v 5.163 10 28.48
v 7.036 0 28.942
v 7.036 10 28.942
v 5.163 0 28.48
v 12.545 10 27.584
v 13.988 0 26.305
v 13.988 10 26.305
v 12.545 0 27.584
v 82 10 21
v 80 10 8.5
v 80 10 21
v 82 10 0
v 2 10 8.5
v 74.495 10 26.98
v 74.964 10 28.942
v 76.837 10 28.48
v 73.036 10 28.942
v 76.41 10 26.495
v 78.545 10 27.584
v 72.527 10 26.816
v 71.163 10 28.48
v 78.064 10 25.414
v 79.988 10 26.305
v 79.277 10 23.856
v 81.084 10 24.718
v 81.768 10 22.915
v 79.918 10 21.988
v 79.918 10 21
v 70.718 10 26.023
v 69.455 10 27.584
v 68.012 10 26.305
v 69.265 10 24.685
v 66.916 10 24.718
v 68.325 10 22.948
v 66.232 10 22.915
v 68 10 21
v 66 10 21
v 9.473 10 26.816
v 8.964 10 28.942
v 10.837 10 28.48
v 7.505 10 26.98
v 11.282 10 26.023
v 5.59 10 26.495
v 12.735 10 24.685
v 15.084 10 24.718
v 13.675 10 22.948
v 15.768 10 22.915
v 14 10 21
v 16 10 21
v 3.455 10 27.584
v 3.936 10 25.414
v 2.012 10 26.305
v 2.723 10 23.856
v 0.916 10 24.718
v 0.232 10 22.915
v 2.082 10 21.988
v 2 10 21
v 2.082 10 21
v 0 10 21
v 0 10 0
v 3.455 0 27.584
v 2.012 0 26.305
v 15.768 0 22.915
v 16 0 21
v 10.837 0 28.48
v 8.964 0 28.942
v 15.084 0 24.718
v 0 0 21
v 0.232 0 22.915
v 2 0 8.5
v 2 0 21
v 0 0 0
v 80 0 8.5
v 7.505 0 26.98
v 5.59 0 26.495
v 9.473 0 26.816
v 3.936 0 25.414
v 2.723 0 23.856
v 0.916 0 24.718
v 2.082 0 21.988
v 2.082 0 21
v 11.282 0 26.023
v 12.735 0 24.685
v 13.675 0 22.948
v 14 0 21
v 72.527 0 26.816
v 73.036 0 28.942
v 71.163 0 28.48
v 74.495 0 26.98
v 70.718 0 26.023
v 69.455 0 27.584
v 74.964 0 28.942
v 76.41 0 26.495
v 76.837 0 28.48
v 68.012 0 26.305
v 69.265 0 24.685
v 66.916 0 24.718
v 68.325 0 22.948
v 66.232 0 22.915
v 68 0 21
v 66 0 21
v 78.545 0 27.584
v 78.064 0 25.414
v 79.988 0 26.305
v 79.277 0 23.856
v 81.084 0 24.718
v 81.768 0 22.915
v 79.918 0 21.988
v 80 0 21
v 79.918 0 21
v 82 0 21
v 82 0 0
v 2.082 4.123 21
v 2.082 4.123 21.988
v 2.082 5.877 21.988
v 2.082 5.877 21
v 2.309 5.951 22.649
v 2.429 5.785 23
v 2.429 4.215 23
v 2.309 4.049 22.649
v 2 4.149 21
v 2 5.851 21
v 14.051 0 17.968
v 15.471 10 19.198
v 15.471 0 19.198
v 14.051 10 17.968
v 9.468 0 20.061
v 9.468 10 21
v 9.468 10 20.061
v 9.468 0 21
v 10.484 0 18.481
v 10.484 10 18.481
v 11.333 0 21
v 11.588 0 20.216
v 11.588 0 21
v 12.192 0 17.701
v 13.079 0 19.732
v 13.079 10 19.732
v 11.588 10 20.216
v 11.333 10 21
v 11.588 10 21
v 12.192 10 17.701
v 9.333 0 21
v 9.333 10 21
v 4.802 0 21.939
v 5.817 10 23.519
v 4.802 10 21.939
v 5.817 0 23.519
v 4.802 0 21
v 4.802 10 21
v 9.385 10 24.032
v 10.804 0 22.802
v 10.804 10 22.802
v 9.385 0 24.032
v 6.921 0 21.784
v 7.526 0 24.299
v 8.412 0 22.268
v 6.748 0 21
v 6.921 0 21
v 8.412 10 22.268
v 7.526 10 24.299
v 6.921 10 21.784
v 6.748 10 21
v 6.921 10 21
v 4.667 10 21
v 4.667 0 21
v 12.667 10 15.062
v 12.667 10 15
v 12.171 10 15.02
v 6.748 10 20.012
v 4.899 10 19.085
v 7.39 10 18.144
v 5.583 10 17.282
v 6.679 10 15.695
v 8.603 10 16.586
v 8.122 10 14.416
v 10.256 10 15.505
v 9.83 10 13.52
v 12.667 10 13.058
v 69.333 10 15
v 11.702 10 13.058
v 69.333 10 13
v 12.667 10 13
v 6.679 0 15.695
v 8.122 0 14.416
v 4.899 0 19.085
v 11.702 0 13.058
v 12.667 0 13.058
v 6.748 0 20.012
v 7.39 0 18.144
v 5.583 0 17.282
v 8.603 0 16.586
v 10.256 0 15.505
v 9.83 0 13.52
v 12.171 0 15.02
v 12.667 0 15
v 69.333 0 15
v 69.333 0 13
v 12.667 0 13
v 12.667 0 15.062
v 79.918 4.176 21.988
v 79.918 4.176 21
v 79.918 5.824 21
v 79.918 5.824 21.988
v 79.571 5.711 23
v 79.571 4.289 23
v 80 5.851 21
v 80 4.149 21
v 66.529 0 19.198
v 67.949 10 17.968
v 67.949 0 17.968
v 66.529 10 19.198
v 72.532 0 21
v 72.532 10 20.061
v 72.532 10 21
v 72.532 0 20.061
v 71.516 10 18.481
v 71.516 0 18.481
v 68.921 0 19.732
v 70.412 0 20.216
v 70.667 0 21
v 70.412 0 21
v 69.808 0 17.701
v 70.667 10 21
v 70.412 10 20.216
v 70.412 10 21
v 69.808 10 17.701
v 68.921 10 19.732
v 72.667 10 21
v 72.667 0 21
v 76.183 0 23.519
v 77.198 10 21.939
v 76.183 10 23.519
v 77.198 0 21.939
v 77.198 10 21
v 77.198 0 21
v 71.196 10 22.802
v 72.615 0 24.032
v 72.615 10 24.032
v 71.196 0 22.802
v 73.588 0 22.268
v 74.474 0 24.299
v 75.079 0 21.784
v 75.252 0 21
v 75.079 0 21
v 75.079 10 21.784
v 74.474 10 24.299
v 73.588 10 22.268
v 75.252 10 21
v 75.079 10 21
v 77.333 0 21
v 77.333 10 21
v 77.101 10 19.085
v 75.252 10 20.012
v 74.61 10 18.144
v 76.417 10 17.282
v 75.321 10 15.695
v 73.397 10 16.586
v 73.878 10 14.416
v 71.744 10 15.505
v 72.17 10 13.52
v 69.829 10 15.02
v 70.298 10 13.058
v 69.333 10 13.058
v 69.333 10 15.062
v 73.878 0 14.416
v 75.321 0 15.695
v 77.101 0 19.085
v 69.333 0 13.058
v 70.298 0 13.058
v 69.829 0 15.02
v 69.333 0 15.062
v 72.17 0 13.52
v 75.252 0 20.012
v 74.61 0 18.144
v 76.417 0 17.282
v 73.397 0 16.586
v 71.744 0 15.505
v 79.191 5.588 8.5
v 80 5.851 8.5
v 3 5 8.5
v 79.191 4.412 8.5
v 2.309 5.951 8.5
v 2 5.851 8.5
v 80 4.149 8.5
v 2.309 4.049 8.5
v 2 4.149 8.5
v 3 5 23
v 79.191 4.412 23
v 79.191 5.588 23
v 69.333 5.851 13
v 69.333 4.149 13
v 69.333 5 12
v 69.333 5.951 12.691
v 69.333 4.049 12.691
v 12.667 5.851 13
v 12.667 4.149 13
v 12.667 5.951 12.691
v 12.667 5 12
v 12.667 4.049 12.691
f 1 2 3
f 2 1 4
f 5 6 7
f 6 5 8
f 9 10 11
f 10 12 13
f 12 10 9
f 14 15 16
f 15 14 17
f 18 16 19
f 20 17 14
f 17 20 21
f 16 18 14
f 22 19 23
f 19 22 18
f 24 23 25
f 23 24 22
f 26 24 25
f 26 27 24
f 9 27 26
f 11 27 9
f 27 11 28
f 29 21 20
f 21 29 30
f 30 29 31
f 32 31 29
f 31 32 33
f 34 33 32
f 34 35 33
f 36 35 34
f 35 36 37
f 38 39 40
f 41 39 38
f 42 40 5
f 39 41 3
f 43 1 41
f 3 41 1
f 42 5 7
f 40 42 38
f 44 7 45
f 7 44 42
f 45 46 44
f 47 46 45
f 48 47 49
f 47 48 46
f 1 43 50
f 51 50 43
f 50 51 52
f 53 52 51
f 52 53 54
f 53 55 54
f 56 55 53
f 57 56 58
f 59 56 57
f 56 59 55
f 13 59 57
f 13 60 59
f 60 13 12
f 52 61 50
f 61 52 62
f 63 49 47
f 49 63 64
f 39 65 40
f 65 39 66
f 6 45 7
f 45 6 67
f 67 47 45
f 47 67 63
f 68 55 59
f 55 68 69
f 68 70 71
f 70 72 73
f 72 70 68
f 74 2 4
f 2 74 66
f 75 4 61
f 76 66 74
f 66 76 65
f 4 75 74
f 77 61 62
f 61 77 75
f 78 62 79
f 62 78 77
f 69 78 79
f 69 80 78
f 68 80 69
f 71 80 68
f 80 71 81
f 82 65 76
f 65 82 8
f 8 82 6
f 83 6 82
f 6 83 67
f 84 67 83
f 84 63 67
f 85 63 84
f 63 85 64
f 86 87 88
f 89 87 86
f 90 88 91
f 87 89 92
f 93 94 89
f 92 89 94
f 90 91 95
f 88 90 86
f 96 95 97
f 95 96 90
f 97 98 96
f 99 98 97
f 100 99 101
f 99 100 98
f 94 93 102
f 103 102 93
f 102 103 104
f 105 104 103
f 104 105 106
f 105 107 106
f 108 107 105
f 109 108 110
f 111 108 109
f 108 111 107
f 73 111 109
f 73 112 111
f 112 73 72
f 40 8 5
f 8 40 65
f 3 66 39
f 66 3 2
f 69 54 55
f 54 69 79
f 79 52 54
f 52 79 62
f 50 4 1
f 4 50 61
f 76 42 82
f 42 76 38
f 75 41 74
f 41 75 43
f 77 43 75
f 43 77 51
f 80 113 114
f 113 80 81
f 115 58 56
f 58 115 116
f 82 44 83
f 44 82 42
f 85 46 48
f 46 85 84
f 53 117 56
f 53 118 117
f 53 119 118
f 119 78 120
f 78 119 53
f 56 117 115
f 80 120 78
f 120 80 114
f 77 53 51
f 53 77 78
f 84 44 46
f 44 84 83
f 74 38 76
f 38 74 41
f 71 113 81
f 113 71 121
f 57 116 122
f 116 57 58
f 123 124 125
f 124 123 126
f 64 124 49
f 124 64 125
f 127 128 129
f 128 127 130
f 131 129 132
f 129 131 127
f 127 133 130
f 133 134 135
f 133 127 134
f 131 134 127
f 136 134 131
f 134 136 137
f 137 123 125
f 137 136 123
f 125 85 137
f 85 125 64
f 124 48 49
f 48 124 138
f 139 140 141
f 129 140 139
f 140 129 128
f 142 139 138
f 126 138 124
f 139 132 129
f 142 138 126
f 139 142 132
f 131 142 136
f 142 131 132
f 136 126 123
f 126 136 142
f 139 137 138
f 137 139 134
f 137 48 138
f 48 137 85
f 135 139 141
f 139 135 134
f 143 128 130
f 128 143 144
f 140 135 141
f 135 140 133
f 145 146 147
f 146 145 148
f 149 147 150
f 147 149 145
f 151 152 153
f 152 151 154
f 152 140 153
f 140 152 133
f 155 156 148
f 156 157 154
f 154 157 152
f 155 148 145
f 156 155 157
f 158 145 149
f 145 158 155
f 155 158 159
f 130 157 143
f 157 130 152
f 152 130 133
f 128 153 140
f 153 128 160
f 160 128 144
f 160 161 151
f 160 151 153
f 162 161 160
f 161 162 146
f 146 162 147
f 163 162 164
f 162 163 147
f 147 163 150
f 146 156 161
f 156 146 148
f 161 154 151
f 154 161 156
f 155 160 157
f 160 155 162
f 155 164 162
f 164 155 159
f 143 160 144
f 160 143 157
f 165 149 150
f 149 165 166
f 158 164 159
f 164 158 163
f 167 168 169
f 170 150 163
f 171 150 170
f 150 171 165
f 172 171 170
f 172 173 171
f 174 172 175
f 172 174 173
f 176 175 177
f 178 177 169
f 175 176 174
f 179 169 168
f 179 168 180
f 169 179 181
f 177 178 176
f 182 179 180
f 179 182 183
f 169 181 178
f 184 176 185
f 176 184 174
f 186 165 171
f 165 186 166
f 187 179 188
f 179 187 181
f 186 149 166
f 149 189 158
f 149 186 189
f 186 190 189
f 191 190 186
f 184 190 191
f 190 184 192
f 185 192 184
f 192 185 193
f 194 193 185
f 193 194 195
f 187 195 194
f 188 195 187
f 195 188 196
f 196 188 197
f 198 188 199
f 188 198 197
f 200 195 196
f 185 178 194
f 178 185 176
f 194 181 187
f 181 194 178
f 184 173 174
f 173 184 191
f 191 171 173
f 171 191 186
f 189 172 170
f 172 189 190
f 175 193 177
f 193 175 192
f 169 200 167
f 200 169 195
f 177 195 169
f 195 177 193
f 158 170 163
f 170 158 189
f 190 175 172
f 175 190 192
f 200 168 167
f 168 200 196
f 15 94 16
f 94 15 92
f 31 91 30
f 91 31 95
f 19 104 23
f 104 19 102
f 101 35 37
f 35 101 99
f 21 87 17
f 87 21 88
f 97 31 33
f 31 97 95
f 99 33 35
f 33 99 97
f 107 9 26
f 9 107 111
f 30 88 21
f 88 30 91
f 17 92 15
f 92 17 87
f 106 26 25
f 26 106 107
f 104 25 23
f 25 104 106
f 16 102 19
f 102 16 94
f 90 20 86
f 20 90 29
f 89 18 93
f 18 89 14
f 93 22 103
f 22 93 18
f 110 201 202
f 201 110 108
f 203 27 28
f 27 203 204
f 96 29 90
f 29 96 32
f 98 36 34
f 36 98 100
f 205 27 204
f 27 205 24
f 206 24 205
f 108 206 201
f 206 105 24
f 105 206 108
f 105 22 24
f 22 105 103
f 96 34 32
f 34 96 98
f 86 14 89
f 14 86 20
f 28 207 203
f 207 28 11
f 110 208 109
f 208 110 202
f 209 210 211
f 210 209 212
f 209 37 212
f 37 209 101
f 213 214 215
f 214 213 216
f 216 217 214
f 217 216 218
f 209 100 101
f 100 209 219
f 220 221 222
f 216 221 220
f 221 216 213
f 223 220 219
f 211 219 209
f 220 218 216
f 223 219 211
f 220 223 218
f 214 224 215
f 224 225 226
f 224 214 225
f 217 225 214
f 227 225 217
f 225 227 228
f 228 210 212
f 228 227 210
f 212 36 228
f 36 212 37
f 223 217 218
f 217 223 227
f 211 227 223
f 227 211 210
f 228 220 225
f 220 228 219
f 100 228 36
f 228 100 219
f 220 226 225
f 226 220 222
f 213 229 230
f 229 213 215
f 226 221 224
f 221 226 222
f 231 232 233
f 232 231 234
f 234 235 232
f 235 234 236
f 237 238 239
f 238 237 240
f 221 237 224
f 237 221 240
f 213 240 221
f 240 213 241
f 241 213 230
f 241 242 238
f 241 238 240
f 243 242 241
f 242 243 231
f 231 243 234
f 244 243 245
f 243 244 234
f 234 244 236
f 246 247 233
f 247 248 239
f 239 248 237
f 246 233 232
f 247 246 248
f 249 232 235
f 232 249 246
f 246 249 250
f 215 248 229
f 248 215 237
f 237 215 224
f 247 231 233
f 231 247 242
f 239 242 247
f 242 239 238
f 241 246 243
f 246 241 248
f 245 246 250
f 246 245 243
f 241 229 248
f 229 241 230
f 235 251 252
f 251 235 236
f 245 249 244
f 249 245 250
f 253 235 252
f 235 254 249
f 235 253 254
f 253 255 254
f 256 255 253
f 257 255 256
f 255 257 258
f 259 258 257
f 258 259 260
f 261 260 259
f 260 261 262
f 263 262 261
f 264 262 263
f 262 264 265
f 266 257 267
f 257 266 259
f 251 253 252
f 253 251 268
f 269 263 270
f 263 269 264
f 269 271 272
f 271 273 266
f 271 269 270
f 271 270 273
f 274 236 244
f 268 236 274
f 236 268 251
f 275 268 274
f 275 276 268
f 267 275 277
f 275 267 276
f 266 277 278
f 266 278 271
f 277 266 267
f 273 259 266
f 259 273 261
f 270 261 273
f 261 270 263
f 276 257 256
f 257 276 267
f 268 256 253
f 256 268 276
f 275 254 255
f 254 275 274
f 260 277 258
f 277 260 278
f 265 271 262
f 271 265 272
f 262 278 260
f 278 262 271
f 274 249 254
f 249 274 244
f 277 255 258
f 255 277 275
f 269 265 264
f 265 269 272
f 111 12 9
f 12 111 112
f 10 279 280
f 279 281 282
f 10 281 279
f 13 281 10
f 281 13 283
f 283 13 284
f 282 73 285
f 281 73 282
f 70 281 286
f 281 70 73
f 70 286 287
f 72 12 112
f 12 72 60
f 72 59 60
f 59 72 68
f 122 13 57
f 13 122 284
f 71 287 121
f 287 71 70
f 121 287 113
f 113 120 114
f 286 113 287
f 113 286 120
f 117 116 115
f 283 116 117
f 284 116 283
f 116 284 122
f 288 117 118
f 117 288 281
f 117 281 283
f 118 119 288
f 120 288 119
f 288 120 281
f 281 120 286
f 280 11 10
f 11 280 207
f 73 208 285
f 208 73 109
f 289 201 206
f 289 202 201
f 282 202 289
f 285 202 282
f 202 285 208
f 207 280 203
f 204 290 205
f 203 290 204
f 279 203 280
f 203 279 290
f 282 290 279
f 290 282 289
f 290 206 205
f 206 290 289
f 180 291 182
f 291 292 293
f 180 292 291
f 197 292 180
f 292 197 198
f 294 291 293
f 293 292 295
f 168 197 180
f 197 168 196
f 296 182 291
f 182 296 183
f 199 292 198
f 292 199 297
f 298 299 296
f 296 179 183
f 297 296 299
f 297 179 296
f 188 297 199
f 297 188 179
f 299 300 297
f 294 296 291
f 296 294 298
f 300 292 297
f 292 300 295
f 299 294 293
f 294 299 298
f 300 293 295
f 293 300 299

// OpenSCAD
/*[Global]*/

//---length = 0;

/*[Dimensions]*/

//Select a value larger than the width of your door, at least on 10 millimeters
platform_length = 50; //[10:100]

//height of pring platform. it should be highter then distance from floor to door on few mm
height = 15; // [10:40]
//thickness of door holder base
height_base = 8.5; // [2.5:30]
//width of door holder
width = 10; // [10:40]

/*[Other settings (better to do not change them:)]*/

//thickness of spring, for me 2.5 is good
thickness = 2; // [1.5:3.5]
//Radius of holder springs. ~10mm is fine
r_spring = 8; //[5:15]
//Divider of spring radius, it is actualy works with values from 2.1 to 2.9. I prefer to use r_divider = 2.4
r_divider = 2.4;
//Do you wanna add ribs?
is_reinforced = 1; // [0:no,1:yes]

/*[Hidden]*/
length = platform_length + 4 * r_spring;


// ------------------



draw_part();

module draw_part() {
    cube([length, width, height_base]);  // BASE
    /* SUPPORTS */
    translate([0, 0, height_base]) 
    cube([thickness, width, height - height_base + r_spring - thickness]);
    if (is_reinforced == 1) { translate([thickness, width/2, height_base]) cylinder(h=height  - height_base + r_spring, r=thickness/2); }
    
    translate([length-thickness, 0, height_base]) 
    cube([thickness, width, height - height_base + r_spring - thickness]);
    if (is_reinforced == 1) { translate([length-thickness, width/2, height_base]) cylinder(h=height - height_base + r_spring, r=thickness/2); }
    /* -SUPPORTS- */
    
    /* SPRINGS */
    translate([0,0,height+r_spring-thickness])  draw_spring();
    translate([length,0,height+r_spring-thickness]) mirror([1,0,0]) { draw_spring(); }
    /* -SPRINGS- */
    
    /* PLATFORM */
    translate ([-r_spring/r_divider*4+r_spring*3+thickness,0,height-thickness]) 
    cube([length-2*(-r_spring/r_divider*4+r_spring*3+thickness),width,thickness]);
    translate([length/2, width/2, height-thickness]) 
    
    if (is_reinforced == 1) { rotate([0, 90, 0]) cylinder(h=length-2*(-r_spring/r_divider*4+r_spring*3+thickness), r=thickness/2,center = true); }
    /* PLATFORM */
    

}

module draw_spring() {
   translate([r_spring, 0, 0]) {
       difference() {
           rotate([-90, 0, 0]) cylinder(h=width, r=r_spring);
           rotate([-90, 0, 0]) cylinder(h=width+2, r=r_spring-thickness);
           translate([-r_spring, -1, -r_spring])
           cube([r_spring*2,width+2,r_spring]);
       } 
   }
   translate([-r_spring/r_divider+r_spring*2, 0, 0]) {
       difference() {
           rotate([-90, 0, 0]) cylinder(h=width, r=r_spring/r_divider);
           rotate([-90, 0, 0]) cylinder(h=width+2, r=r_spring/r_divider-thickness);
           translate([-r_spring/r_divider, -1, 0])
           cube([r_spring,width+2,r_spring/r_divider]);
           
       }
    }
    
    translate([-r_spring/r_divider*3+r_spring*2+thickness, 0, 0]) {
        //rotate([-90, 0, 0]) cylinder(h=width+2, r=0.5);
        difference() {
           rotate([-90, 0, 0]) cylinder(h=width, r=r_spring/r_divider);
           rotate([-90, 0, 0]) cylinder(h=width+2, r=r_spring/r_divider-thickness);
           translate([-r_spring/r_divider, -1, -r_spring])
           cube([r_spring,width+2,r_spring]);
           
       }
    }
    
 //   translate([r_spring/r_divider*3+thickness*1.4, 0, height+r_spring]) {
    translate([-r_spring/r_divider*4+r_spring*3+thickness, 0, 0]) {
       //rotate([-90, 0, 0]) cylinder(h=width+2, r=0.5);
       difference() {
           rotate([-90, 0, 0]) cylinder(h=width, r=r_spring);
           rotate([-90, 0, 0]) cylinder(h=width+2, r=r_spring-thickness);
           translate([-r_spring, -1, 0])
           cube([r_spring*2,width+2,r_spring]);
           translate([0, -1, -r_spring])
           cube([r_spring,width+2,r_spring]);
           
       }
    }
}
